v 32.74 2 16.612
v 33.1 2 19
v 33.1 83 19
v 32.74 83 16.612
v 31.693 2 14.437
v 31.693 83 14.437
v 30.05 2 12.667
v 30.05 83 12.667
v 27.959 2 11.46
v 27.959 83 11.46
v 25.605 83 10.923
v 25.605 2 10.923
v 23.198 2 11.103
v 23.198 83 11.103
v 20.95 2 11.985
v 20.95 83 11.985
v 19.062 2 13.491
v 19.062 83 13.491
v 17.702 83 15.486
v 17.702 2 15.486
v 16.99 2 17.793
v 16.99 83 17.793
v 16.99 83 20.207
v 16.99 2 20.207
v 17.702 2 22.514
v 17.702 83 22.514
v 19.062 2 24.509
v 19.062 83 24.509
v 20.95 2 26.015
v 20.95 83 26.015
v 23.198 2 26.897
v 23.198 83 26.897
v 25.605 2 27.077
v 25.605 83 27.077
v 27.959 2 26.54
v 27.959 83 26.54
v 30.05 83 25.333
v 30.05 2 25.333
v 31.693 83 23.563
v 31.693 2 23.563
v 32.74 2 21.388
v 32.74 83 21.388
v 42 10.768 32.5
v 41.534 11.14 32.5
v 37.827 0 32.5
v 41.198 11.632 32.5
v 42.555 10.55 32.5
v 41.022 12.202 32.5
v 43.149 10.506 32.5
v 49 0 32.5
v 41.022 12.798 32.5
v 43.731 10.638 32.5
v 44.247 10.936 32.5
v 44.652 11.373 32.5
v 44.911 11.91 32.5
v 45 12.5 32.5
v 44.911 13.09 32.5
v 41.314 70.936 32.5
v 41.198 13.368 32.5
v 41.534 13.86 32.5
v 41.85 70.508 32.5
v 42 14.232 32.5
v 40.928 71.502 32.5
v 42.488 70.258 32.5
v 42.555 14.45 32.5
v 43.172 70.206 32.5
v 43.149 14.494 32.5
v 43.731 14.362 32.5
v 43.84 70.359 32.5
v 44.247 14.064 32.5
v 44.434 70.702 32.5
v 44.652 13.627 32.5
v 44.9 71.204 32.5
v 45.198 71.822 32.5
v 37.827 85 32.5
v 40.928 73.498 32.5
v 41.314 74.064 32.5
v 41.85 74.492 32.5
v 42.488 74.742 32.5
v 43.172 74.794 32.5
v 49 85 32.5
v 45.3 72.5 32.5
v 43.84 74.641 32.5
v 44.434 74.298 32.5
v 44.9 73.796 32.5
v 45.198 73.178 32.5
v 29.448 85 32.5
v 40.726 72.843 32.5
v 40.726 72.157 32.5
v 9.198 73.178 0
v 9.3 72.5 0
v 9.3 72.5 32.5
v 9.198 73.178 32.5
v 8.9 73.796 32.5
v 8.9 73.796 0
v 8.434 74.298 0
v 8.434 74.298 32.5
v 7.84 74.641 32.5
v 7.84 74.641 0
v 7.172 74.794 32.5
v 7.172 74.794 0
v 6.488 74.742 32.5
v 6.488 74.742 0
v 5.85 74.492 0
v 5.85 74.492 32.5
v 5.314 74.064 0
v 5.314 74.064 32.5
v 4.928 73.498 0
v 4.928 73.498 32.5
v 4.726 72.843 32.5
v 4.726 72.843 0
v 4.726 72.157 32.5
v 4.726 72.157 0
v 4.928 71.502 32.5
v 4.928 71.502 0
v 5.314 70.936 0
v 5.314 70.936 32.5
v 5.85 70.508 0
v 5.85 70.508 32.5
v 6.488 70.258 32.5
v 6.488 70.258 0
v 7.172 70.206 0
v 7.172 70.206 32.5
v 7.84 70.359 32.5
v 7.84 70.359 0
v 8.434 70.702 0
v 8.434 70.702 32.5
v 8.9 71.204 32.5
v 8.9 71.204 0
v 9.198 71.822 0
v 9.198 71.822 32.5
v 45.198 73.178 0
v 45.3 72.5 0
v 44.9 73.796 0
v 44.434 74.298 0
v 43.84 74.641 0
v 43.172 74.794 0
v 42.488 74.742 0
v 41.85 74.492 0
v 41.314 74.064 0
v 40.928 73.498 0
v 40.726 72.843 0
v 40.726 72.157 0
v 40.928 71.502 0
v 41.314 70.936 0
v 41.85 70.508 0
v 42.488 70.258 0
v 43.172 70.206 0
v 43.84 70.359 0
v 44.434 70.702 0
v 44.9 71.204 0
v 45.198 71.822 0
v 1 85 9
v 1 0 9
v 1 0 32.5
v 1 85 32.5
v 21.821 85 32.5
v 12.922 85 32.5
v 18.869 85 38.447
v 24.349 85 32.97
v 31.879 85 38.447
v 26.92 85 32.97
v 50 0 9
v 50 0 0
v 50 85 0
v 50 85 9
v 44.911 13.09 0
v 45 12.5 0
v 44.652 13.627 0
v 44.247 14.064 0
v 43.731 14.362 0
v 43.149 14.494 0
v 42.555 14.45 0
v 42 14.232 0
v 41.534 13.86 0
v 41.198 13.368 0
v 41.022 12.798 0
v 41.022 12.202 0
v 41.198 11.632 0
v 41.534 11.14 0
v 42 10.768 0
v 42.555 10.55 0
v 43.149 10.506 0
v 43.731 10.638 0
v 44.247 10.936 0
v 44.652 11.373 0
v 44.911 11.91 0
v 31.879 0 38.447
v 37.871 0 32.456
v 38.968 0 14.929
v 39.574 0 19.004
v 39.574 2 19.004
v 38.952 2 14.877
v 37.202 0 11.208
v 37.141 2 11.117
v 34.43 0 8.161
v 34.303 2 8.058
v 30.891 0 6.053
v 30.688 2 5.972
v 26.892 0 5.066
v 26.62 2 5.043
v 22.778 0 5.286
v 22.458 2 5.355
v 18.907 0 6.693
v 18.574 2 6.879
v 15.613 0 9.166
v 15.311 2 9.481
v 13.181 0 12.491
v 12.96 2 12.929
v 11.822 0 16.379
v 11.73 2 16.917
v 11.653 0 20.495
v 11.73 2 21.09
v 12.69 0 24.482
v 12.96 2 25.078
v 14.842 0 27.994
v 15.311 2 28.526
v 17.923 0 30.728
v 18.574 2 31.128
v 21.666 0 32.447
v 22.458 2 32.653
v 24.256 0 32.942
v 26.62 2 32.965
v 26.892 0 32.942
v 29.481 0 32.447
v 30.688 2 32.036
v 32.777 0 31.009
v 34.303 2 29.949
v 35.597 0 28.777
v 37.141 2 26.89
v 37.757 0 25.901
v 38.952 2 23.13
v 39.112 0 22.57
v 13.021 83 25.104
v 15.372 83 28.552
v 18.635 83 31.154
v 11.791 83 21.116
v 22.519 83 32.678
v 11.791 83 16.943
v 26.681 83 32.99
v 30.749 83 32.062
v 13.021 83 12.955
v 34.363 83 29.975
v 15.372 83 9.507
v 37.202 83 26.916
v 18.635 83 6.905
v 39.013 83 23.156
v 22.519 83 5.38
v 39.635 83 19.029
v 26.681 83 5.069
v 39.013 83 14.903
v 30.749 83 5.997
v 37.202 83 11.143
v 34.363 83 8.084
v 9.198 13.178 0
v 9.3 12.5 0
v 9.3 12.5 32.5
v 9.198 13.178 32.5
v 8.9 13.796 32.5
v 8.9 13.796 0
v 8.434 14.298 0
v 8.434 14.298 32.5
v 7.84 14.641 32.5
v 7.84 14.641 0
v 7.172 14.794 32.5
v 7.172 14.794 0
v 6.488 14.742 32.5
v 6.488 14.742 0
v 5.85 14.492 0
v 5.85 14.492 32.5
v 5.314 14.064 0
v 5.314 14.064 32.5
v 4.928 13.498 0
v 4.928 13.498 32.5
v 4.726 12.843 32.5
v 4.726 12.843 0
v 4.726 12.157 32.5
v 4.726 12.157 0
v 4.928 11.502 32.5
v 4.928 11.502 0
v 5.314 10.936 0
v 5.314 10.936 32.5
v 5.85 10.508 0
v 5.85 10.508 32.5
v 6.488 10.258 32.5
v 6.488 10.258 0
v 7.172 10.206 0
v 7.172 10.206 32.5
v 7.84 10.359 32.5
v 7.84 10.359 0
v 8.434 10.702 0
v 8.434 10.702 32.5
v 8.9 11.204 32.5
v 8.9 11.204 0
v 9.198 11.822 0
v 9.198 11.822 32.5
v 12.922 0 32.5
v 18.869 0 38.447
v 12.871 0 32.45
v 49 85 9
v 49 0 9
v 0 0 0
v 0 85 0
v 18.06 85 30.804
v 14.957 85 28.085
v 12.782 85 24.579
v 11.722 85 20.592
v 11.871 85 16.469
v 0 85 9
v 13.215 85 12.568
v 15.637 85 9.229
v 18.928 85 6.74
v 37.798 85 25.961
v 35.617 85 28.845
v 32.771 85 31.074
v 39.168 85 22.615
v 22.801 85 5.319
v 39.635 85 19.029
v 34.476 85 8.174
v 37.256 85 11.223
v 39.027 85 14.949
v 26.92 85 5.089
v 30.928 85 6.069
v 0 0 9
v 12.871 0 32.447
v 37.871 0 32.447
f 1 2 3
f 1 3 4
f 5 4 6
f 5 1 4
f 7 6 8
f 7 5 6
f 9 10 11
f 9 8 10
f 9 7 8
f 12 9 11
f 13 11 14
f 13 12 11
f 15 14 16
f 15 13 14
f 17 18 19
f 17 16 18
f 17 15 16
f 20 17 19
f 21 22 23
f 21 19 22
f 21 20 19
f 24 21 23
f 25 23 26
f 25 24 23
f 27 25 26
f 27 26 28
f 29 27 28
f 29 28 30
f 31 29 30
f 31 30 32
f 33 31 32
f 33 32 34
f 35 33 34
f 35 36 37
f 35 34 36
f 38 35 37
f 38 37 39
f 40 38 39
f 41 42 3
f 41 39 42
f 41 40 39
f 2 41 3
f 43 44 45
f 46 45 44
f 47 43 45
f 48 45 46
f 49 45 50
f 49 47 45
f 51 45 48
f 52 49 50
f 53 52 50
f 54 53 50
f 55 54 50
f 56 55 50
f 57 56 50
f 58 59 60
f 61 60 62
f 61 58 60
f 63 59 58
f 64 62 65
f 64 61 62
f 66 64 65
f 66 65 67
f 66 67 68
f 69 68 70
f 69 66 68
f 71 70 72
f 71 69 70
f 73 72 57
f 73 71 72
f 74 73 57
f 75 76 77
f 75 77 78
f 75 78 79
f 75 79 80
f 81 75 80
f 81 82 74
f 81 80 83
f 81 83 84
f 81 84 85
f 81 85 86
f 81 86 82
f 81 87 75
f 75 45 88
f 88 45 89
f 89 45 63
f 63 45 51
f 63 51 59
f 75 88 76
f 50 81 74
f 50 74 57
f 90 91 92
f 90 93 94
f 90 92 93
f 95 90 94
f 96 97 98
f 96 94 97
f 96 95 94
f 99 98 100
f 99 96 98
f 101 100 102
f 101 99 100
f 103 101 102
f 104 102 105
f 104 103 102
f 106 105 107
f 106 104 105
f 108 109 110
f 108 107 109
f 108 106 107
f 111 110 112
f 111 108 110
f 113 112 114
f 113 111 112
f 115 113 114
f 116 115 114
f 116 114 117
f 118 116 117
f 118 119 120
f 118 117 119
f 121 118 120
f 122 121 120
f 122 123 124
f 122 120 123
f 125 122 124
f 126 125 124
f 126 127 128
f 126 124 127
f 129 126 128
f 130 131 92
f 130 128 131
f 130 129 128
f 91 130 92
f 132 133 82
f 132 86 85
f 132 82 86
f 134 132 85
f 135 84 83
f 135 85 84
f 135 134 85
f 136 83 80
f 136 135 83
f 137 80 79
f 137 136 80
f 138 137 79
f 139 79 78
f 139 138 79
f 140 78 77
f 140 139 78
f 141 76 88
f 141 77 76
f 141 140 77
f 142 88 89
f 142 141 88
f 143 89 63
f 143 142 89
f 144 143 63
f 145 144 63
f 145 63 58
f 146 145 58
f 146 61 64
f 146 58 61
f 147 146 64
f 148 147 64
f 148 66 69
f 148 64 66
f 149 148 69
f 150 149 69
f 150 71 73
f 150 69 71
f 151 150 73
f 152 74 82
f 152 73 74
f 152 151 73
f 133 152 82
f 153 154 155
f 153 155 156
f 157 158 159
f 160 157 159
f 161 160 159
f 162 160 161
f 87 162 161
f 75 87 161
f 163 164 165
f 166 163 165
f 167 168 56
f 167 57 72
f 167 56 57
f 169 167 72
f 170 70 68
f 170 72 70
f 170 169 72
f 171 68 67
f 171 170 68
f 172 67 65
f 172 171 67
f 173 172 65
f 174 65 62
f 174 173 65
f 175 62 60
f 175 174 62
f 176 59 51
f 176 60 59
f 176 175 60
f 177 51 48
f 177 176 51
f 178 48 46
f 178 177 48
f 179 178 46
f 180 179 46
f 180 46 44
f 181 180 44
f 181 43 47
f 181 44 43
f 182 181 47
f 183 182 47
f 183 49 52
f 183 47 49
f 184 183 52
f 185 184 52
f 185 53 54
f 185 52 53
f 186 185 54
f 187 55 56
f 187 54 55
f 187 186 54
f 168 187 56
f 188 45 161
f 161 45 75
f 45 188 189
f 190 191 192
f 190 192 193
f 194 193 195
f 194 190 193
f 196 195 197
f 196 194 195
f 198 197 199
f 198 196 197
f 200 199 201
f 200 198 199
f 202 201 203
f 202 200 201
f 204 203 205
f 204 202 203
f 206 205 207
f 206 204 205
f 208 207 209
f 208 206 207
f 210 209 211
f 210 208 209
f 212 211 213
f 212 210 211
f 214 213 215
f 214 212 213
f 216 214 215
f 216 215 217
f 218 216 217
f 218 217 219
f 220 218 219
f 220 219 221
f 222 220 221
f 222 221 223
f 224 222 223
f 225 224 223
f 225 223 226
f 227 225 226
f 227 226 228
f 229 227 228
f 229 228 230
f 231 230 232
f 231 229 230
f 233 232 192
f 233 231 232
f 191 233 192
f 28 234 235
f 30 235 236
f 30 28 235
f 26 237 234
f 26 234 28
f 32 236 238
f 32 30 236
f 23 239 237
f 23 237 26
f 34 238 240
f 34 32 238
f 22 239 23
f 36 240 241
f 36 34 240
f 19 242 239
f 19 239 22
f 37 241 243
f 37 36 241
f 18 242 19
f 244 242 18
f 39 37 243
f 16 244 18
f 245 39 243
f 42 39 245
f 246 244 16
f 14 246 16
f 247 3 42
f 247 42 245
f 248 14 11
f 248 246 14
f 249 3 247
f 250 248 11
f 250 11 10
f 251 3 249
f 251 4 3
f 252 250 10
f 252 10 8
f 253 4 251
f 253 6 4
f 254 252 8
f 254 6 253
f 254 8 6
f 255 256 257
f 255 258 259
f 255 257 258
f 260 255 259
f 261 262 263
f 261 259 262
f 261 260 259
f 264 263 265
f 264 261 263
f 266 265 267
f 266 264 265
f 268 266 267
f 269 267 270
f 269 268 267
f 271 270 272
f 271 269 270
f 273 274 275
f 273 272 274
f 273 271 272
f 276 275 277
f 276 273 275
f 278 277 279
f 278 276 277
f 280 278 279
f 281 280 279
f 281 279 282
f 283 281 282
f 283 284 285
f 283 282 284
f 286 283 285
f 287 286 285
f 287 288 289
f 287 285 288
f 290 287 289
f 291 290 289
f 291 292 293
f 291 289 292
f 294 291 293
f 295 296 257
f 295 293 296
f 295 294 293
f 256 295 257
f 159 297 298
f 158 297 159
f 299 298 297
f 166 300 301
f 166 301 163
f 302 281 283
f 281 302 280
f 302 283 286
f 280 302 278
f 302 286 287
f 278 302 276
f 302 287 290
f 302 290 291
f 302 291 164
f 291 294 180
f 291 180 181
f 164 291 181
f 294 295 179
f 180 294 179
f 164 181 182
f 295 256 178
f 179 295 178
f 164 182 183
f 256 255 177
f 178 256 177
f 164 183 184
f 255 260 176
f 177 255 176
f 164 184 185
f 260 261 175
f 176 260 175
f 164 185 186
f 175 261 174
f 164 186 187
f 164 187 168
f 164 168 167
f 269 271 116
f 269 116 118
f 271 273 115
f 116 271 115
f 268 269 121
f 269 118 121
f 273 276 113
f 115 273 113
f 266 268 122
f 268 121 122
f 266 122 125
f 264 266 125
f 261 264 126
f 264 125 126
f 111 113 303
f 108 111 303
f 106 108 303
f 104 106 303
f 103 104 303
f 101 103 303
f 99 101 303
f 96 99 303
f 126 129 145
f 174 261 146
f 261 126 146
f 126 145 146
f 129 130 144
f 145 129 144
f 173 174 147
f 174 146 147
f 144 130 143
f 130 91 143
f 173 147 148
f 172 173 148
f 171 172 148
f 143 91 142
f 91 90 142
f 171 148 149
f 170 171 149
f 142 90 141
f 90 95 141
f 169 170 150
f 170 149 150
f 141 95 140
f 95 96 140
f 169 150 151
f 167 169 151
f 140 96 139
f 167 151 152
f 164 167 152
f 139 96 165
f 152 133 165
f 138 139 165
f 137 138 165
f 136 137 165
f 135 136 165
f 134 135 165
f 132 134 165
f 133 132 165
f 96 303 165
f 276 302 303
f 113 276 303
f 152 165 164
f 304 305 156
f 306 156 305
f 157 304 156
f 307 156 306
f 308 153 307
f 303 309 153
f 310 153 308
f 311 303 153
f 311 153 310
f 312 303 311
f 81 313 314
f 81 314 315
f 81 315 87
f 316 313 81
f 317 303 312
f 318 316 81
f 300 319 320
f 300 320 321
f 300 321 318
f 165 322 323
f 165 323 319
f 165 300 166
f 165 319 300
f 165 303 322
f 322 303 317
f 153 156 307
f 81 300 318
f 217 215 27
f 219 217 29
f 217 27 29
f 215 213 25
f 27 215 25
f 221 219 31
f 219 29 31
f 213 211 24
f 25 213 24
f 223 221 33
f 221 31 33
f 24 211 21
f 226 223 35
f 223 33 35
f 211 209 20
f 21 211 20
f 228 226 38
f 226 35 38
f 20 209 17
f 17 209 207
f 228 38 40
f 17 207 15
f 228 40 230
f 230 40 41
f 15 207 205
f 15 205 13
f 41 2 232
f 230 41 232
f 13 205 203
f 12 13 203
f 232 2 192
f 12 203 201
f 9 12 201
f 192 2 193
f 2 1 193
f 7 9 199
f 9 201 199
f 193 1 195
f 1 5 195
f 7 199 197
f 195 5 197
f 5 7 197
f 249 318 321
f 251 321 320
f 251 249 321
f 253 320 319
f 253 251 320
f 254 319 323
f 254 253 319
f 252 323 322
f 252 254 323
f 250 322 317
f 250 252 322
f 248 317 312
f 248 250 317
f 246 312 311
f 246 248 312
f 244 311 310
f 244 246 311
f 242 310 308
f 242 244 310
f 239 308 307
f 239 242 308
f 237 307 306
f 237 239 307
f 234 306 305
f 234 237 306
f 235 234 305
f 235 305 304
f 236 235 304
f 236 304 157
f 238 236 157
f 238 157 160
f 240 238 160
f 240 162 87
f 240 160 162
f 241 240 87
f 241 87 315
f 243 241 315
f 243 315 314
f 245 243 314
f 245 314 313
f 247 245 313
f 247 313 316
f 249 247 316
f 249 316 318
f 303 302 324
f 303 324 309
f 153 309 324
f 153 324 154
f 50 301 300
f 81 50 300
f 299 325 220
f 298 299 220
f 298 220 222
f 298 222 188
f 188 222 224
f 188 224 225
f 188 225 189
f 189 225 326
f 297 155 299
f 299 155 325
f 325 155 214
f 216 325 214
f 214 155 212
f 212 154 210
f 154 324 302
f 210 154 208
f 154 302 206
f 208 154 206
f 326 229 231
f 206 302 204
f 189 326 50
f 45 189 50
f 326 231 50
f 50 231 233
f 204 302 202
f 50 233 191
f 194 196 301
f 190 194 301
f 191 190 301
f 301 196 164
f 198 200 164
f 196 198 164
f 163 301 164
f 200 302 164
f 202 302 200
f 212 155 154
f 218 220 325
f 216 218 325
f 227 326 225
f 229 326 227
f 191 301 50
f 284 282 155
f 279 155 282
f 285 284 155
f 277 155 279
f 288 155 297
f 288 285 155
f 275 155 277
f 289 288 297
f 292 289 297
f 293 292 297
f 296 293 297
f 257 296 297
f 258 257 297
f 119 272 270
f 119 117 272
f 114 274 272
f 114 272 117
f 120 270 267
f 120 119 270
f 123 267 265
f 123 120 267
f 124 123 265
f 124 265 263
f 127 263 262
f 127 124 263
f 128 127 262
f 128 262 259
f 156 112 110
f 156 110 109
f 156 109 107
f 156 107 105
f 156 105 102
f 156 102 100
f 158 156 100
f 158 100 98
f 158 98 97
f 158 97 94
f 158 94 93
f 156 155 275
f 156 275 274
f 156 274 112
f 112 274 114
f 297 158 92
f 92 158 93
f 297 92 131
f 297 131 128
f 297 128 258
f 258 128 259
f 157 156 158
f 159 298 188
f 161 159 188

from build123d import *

# Parameters (mm, degrees)
CYLINDER006_R          = 14
CYLINDER006_DEPTH      = 3
CYLINDER006_ROLL_ANGLE = -90
CYLINDER005_R          = 14
CYLINDER005_DEPTH      = 3
CYLINDER005_ROLL_ANGLE = -90
CYLINDER004_R          = 2.3
CYLINDER004_DEPTH      = 40
CYLINDER003_R          = 2
CYLINDER003_DEPTH      = 40
CYLINDER002_R          = 2.3
CYLINDER002_DEPTH      = 40
CYLINDER001_R          = 2.3
CYLINDER001_DEPTH      = 40
BOX005_W               = 1
BOX005_H               = 85
BOX005_DEPTH           = 23.5
BOX004_W               = 1
BOX004_H               = 85
BOX004_DEPTH           = 23.5
BOX003_W               = 10
BOX003_H               = 90
BOX003_DEPTH           = 10
BOX003_ROLL_ANGLE      = 3e-06
BOX003_PITCH_ANGLE     = -44.999934
BOX003_PLACEMENT_ANGLE = -7e-06
BOX002_W               = 10
BOX002_H               = 90
BOX002_DEPTH           = 10
BOX002_ROLL_ANGLE      = 3e-06
BOX002_PITCH_ANGLE     = 44.999934
BOX002_PLACEMENT_ANGLE = 7e-06
BOX001_W               = 25
BOX001_H               = 85
BOX001_DEPTH           = 6
CYLINDER_R             = 8.1
CYLINDER_DEPTH         = 100
CYLINDER_ROLL_ANGLE    = -90
BOX_W                  = 50
BOX_H                  = 85
BOX_DEPTH              = 32.5


with BuildPart() as cylinder006:
    # Cylinder006 → Cylinder006 (new body)
    with BuildSketch(Plane.XY):
        Circle(CYLINDER006_R)
    extrude(amount=CYLINDER006_DEPTH)


with BuildPart() as cylinder006_1:
    # Cylinder006 roll: moved
    add(cylinder006.part.rotate(Axis((0, 0, 0), (1, 0, 0)), CYLINDER006_ROLL_ANGLE))


with BuildPart() as cylinder006_2:
    # Cylinder006 placement: moved
    add(cylinder006_1.part.moved(Location((25.6346, 83, 19.0294))))


with BuildPart() as cylinder005:
    # Cylinder005 → Cylinder005 (new body)
    with BuildSketch(Plane.XY):
        Circle(CYLINDER005_R)
    extrude(amount=CYLINDER005_DEPTH)


with BuildPart() as cylinder005_1:
    # Cylinder005 roll: moved
    add(cylinder005.part.rotate(Axis((0, 0, 0), (1, 0, 0)), CYLINDER005_ROLL_ANGLE))


with BuildPart() as cylinder005_2:
    # Cylinder005 placement: moved
    add(cylinder005_1.part.moved(Location((25.5737, -1, 19.0038))))


with BuildPart() as cylinder004:
    # Cylinder004 → Cylinder004 (new body)
    with BuildSketch(Plane(origin=(43, 72.5, -4), x_dir=(1, 0, 0), z_dir=(0, 0, 1))):
        Circle(CYLINDER004_R)
    extrude(amount=CYLINDER004_DEPTH)


with BuildPart() as cylinder003:
    # Cylinder003 → Cylinder003 (new body)
    with BuildSketch(Plane(origin=(43, 12.5, -4), x_dir=(1, 0, 0), z_dir=(0, 0, 1))):
        Circle(CYLINDER003_R)
    extrude(amount=CYLINDER003_DEPTH)


with BuildPart() as cylinder002:
    # Cylinder002 → Cylinder002 (new body)
    with BuildSketch(Plane(origin=(7, 72.5, -3), x_dir=(1, 0, 0), z_dir=(0, 0, 1))):
        Circle(CYLINDER002_R)
    extrude(amount=CYLINDER002_DEPTH)


with BuildPart() as cylinder001:
    # Cylinder001 → Cylinder001 (new body)
    with BuildSketch(Plane(origin=(7, 12.5, -2), x_dir=(1, 0, 0), z_dir=(0, 0, 1))):
        Circle(CYLINDER001_R)
    extrude(amount=CYLINDER001_DEPTH)


with BuildPart() as box005:
    # Box005 → Box005 (new body)
    with BuildSketch(Plane(origin=(49, 0, 9), x_dir=(1, 0, 0), z_dir=(0, 0, 1))):
        with Locations((0.5, 42.5)):
            Rectangle(BOX005_W, BOX005_H)
    extrude(amount=BOX005_DEPTH)


with BuildPart() as box004:
    # Box004 → Box004 (new body)
    with BuildSketch(Plane.XY.offset(9)):
        with Locations((0.5, 42.5)):
            Rectangle(BOX004_W, BOX004_H)
    extrude(amount=BOX004_DEPTH)


with BuildPart() as box003:
    # Box003 → Box003 (new body)
    with BuildSketch(Plane.XY):
        with Locations((5, 45)):
            Rectangle(BOX003_W, BOX003_H)
    extrude(amount=BOX003_DEPTH)


with BuildPart() as box003_1:
    # Box003 roll: moved
    add(box003.part.rotate(Axis((0, 0, 0), (1, 0, 0)), BOX003_ROLL_ANGLE))


with BuildPart() as box003_2:
    # Box003 pitch: moved
    add(box003_1.part.rotate(Axis((0, 0, 0), (0, 1, 0)), BOX003_PITCH_ANGLE))


with BuildPart() as box003_3:
    # Box003 placement: moved
    add(box003_2.part.moved(Location((-18.82, -2, 2.25))).rotate(Axis((-18.82, -2, 2.25), (0, 0, 1)), BOX003_PLACEMENT_ANGLE))


with BuildPart() as box002:
    # Box002 → Box002 (new body)
    with BuildSketch(Plane.XY):
        with Locations((5, 45)):
            Rectangle(BOX002_W, BOX002_H)
    extrude(amount=BOX002_DEPTH)


with BuildPart() as box002_1:
    # Box002 roll: moved
    add(box002.part.rotate(Axis((0, 0, 0), (1, 0, 0)), BOX002_ROLL_ANGLE))


with BuildPart() as box002_2:
    # Box002 pitch: moved
    add(box002_1.part.rotate(Axis((0, 0, 0), (0, 1, 0)), BOX002_PITCH_ANGLE))


with BuildPart() as box002_3:
    # Box002 placement: moved
    add(box002_2.part.moved(Location((-50.8986, -3, 9.31859))).rotate(Axis((-50.8986, -3, 9.31859), (0, 0, 1)), BOX002_PLACEMENT_ANGLE))


with BuildPart() as cut002:
    # Box001 → Box001 (new body)
    with BuildSketch(Plane(origin=(-43.825523, -3.3e-05, 2.247464), x_dir=(1, 0, 0), z_dir=(0, 0, 1))):
        with Locations((12.5, 42.5)):
            Rectangle(BOX001_W, BOX001_H)
    extrude(amount=BOX001_DEPTH)

    # Cut001: cut Box002
    add(box002_3.part, mode=Mode.SUBTRACT)

    # Cut002: cut Box003
    add(box003_3.part, mode=Mode.SUBTRACT)


with BuildPart() as cut002_1:
    # Cut002 placement: moved
    add(cut002.part.moved(Location((56.6969, -0.000184, 30.2))))


with BuildPart() as cylinder:
    # Cylinder → Cylinder (new body)
    with BuildSketch(Plane.XY):
        Circle(CYLINDER_R)
    extrude(amount=CYLINDER_DEPTH)


with BuildPart() as cylinder_1:
    # Cylinder roll: moved
    add(cylinder.part.rotate(Axis((0, 0, 0), (1, 0, 0)), CYLINDER_ROLL_ANGLE))


with BuildPart() as cylinder_2:
    # Cylinder placement: moved
    add(cylinder_1.part.moved(Location((25, -4.78696, 19))))


with BuildPart() as cut011:
    # Box → Box (new body)
    with BuildSketch(Plane.XY):
        with Locations((25, 42.5)):
            Rectangle(BOX_W, BOX_H)
    extrude(amount=BOX_DEPTH)

    # Cut: cut Cylinder
    add(cylinder_2.part, mode=Mode.SUBTRACT)

    # Fusion: union Cut002
    add(cut002_1.part)

    # Cut003: cut Box004
    add(box004.part, mode=Mode.SUBTRACT)

    # Cut004: cut Box005
    add(box005.part, mode=Mode.SUBTRACT)

    # Cut005: cut Cylinder001
    add(cylinder001.part, mode=Mode.SUBTRACT)

    # Cut006: cut Cylinder002
    add(cylinder002.part, mode=Mode.SUBTRACT)

    # Cut007: cut Cylinder003
    add(cylinder003.part, mode=Mode.SUBTRACT)

    # Cut008: cut Cylinder004
    add(cylinder004.part, mode=Mode.SUBTRACT)

    # Cut009: cut Cylinder005
    add(cylinder005_2.part, mode=Mode.SUBTRACT)

    # Cut010: cut Cylinder005
    add(cylinder005_2.part, mode=Mode.SUBTRACT)

    # Cut011: cut Cylinder006
    add(cylinder006_2.part, mode=Mode.SUBTRACT)


solid = cut011.part
